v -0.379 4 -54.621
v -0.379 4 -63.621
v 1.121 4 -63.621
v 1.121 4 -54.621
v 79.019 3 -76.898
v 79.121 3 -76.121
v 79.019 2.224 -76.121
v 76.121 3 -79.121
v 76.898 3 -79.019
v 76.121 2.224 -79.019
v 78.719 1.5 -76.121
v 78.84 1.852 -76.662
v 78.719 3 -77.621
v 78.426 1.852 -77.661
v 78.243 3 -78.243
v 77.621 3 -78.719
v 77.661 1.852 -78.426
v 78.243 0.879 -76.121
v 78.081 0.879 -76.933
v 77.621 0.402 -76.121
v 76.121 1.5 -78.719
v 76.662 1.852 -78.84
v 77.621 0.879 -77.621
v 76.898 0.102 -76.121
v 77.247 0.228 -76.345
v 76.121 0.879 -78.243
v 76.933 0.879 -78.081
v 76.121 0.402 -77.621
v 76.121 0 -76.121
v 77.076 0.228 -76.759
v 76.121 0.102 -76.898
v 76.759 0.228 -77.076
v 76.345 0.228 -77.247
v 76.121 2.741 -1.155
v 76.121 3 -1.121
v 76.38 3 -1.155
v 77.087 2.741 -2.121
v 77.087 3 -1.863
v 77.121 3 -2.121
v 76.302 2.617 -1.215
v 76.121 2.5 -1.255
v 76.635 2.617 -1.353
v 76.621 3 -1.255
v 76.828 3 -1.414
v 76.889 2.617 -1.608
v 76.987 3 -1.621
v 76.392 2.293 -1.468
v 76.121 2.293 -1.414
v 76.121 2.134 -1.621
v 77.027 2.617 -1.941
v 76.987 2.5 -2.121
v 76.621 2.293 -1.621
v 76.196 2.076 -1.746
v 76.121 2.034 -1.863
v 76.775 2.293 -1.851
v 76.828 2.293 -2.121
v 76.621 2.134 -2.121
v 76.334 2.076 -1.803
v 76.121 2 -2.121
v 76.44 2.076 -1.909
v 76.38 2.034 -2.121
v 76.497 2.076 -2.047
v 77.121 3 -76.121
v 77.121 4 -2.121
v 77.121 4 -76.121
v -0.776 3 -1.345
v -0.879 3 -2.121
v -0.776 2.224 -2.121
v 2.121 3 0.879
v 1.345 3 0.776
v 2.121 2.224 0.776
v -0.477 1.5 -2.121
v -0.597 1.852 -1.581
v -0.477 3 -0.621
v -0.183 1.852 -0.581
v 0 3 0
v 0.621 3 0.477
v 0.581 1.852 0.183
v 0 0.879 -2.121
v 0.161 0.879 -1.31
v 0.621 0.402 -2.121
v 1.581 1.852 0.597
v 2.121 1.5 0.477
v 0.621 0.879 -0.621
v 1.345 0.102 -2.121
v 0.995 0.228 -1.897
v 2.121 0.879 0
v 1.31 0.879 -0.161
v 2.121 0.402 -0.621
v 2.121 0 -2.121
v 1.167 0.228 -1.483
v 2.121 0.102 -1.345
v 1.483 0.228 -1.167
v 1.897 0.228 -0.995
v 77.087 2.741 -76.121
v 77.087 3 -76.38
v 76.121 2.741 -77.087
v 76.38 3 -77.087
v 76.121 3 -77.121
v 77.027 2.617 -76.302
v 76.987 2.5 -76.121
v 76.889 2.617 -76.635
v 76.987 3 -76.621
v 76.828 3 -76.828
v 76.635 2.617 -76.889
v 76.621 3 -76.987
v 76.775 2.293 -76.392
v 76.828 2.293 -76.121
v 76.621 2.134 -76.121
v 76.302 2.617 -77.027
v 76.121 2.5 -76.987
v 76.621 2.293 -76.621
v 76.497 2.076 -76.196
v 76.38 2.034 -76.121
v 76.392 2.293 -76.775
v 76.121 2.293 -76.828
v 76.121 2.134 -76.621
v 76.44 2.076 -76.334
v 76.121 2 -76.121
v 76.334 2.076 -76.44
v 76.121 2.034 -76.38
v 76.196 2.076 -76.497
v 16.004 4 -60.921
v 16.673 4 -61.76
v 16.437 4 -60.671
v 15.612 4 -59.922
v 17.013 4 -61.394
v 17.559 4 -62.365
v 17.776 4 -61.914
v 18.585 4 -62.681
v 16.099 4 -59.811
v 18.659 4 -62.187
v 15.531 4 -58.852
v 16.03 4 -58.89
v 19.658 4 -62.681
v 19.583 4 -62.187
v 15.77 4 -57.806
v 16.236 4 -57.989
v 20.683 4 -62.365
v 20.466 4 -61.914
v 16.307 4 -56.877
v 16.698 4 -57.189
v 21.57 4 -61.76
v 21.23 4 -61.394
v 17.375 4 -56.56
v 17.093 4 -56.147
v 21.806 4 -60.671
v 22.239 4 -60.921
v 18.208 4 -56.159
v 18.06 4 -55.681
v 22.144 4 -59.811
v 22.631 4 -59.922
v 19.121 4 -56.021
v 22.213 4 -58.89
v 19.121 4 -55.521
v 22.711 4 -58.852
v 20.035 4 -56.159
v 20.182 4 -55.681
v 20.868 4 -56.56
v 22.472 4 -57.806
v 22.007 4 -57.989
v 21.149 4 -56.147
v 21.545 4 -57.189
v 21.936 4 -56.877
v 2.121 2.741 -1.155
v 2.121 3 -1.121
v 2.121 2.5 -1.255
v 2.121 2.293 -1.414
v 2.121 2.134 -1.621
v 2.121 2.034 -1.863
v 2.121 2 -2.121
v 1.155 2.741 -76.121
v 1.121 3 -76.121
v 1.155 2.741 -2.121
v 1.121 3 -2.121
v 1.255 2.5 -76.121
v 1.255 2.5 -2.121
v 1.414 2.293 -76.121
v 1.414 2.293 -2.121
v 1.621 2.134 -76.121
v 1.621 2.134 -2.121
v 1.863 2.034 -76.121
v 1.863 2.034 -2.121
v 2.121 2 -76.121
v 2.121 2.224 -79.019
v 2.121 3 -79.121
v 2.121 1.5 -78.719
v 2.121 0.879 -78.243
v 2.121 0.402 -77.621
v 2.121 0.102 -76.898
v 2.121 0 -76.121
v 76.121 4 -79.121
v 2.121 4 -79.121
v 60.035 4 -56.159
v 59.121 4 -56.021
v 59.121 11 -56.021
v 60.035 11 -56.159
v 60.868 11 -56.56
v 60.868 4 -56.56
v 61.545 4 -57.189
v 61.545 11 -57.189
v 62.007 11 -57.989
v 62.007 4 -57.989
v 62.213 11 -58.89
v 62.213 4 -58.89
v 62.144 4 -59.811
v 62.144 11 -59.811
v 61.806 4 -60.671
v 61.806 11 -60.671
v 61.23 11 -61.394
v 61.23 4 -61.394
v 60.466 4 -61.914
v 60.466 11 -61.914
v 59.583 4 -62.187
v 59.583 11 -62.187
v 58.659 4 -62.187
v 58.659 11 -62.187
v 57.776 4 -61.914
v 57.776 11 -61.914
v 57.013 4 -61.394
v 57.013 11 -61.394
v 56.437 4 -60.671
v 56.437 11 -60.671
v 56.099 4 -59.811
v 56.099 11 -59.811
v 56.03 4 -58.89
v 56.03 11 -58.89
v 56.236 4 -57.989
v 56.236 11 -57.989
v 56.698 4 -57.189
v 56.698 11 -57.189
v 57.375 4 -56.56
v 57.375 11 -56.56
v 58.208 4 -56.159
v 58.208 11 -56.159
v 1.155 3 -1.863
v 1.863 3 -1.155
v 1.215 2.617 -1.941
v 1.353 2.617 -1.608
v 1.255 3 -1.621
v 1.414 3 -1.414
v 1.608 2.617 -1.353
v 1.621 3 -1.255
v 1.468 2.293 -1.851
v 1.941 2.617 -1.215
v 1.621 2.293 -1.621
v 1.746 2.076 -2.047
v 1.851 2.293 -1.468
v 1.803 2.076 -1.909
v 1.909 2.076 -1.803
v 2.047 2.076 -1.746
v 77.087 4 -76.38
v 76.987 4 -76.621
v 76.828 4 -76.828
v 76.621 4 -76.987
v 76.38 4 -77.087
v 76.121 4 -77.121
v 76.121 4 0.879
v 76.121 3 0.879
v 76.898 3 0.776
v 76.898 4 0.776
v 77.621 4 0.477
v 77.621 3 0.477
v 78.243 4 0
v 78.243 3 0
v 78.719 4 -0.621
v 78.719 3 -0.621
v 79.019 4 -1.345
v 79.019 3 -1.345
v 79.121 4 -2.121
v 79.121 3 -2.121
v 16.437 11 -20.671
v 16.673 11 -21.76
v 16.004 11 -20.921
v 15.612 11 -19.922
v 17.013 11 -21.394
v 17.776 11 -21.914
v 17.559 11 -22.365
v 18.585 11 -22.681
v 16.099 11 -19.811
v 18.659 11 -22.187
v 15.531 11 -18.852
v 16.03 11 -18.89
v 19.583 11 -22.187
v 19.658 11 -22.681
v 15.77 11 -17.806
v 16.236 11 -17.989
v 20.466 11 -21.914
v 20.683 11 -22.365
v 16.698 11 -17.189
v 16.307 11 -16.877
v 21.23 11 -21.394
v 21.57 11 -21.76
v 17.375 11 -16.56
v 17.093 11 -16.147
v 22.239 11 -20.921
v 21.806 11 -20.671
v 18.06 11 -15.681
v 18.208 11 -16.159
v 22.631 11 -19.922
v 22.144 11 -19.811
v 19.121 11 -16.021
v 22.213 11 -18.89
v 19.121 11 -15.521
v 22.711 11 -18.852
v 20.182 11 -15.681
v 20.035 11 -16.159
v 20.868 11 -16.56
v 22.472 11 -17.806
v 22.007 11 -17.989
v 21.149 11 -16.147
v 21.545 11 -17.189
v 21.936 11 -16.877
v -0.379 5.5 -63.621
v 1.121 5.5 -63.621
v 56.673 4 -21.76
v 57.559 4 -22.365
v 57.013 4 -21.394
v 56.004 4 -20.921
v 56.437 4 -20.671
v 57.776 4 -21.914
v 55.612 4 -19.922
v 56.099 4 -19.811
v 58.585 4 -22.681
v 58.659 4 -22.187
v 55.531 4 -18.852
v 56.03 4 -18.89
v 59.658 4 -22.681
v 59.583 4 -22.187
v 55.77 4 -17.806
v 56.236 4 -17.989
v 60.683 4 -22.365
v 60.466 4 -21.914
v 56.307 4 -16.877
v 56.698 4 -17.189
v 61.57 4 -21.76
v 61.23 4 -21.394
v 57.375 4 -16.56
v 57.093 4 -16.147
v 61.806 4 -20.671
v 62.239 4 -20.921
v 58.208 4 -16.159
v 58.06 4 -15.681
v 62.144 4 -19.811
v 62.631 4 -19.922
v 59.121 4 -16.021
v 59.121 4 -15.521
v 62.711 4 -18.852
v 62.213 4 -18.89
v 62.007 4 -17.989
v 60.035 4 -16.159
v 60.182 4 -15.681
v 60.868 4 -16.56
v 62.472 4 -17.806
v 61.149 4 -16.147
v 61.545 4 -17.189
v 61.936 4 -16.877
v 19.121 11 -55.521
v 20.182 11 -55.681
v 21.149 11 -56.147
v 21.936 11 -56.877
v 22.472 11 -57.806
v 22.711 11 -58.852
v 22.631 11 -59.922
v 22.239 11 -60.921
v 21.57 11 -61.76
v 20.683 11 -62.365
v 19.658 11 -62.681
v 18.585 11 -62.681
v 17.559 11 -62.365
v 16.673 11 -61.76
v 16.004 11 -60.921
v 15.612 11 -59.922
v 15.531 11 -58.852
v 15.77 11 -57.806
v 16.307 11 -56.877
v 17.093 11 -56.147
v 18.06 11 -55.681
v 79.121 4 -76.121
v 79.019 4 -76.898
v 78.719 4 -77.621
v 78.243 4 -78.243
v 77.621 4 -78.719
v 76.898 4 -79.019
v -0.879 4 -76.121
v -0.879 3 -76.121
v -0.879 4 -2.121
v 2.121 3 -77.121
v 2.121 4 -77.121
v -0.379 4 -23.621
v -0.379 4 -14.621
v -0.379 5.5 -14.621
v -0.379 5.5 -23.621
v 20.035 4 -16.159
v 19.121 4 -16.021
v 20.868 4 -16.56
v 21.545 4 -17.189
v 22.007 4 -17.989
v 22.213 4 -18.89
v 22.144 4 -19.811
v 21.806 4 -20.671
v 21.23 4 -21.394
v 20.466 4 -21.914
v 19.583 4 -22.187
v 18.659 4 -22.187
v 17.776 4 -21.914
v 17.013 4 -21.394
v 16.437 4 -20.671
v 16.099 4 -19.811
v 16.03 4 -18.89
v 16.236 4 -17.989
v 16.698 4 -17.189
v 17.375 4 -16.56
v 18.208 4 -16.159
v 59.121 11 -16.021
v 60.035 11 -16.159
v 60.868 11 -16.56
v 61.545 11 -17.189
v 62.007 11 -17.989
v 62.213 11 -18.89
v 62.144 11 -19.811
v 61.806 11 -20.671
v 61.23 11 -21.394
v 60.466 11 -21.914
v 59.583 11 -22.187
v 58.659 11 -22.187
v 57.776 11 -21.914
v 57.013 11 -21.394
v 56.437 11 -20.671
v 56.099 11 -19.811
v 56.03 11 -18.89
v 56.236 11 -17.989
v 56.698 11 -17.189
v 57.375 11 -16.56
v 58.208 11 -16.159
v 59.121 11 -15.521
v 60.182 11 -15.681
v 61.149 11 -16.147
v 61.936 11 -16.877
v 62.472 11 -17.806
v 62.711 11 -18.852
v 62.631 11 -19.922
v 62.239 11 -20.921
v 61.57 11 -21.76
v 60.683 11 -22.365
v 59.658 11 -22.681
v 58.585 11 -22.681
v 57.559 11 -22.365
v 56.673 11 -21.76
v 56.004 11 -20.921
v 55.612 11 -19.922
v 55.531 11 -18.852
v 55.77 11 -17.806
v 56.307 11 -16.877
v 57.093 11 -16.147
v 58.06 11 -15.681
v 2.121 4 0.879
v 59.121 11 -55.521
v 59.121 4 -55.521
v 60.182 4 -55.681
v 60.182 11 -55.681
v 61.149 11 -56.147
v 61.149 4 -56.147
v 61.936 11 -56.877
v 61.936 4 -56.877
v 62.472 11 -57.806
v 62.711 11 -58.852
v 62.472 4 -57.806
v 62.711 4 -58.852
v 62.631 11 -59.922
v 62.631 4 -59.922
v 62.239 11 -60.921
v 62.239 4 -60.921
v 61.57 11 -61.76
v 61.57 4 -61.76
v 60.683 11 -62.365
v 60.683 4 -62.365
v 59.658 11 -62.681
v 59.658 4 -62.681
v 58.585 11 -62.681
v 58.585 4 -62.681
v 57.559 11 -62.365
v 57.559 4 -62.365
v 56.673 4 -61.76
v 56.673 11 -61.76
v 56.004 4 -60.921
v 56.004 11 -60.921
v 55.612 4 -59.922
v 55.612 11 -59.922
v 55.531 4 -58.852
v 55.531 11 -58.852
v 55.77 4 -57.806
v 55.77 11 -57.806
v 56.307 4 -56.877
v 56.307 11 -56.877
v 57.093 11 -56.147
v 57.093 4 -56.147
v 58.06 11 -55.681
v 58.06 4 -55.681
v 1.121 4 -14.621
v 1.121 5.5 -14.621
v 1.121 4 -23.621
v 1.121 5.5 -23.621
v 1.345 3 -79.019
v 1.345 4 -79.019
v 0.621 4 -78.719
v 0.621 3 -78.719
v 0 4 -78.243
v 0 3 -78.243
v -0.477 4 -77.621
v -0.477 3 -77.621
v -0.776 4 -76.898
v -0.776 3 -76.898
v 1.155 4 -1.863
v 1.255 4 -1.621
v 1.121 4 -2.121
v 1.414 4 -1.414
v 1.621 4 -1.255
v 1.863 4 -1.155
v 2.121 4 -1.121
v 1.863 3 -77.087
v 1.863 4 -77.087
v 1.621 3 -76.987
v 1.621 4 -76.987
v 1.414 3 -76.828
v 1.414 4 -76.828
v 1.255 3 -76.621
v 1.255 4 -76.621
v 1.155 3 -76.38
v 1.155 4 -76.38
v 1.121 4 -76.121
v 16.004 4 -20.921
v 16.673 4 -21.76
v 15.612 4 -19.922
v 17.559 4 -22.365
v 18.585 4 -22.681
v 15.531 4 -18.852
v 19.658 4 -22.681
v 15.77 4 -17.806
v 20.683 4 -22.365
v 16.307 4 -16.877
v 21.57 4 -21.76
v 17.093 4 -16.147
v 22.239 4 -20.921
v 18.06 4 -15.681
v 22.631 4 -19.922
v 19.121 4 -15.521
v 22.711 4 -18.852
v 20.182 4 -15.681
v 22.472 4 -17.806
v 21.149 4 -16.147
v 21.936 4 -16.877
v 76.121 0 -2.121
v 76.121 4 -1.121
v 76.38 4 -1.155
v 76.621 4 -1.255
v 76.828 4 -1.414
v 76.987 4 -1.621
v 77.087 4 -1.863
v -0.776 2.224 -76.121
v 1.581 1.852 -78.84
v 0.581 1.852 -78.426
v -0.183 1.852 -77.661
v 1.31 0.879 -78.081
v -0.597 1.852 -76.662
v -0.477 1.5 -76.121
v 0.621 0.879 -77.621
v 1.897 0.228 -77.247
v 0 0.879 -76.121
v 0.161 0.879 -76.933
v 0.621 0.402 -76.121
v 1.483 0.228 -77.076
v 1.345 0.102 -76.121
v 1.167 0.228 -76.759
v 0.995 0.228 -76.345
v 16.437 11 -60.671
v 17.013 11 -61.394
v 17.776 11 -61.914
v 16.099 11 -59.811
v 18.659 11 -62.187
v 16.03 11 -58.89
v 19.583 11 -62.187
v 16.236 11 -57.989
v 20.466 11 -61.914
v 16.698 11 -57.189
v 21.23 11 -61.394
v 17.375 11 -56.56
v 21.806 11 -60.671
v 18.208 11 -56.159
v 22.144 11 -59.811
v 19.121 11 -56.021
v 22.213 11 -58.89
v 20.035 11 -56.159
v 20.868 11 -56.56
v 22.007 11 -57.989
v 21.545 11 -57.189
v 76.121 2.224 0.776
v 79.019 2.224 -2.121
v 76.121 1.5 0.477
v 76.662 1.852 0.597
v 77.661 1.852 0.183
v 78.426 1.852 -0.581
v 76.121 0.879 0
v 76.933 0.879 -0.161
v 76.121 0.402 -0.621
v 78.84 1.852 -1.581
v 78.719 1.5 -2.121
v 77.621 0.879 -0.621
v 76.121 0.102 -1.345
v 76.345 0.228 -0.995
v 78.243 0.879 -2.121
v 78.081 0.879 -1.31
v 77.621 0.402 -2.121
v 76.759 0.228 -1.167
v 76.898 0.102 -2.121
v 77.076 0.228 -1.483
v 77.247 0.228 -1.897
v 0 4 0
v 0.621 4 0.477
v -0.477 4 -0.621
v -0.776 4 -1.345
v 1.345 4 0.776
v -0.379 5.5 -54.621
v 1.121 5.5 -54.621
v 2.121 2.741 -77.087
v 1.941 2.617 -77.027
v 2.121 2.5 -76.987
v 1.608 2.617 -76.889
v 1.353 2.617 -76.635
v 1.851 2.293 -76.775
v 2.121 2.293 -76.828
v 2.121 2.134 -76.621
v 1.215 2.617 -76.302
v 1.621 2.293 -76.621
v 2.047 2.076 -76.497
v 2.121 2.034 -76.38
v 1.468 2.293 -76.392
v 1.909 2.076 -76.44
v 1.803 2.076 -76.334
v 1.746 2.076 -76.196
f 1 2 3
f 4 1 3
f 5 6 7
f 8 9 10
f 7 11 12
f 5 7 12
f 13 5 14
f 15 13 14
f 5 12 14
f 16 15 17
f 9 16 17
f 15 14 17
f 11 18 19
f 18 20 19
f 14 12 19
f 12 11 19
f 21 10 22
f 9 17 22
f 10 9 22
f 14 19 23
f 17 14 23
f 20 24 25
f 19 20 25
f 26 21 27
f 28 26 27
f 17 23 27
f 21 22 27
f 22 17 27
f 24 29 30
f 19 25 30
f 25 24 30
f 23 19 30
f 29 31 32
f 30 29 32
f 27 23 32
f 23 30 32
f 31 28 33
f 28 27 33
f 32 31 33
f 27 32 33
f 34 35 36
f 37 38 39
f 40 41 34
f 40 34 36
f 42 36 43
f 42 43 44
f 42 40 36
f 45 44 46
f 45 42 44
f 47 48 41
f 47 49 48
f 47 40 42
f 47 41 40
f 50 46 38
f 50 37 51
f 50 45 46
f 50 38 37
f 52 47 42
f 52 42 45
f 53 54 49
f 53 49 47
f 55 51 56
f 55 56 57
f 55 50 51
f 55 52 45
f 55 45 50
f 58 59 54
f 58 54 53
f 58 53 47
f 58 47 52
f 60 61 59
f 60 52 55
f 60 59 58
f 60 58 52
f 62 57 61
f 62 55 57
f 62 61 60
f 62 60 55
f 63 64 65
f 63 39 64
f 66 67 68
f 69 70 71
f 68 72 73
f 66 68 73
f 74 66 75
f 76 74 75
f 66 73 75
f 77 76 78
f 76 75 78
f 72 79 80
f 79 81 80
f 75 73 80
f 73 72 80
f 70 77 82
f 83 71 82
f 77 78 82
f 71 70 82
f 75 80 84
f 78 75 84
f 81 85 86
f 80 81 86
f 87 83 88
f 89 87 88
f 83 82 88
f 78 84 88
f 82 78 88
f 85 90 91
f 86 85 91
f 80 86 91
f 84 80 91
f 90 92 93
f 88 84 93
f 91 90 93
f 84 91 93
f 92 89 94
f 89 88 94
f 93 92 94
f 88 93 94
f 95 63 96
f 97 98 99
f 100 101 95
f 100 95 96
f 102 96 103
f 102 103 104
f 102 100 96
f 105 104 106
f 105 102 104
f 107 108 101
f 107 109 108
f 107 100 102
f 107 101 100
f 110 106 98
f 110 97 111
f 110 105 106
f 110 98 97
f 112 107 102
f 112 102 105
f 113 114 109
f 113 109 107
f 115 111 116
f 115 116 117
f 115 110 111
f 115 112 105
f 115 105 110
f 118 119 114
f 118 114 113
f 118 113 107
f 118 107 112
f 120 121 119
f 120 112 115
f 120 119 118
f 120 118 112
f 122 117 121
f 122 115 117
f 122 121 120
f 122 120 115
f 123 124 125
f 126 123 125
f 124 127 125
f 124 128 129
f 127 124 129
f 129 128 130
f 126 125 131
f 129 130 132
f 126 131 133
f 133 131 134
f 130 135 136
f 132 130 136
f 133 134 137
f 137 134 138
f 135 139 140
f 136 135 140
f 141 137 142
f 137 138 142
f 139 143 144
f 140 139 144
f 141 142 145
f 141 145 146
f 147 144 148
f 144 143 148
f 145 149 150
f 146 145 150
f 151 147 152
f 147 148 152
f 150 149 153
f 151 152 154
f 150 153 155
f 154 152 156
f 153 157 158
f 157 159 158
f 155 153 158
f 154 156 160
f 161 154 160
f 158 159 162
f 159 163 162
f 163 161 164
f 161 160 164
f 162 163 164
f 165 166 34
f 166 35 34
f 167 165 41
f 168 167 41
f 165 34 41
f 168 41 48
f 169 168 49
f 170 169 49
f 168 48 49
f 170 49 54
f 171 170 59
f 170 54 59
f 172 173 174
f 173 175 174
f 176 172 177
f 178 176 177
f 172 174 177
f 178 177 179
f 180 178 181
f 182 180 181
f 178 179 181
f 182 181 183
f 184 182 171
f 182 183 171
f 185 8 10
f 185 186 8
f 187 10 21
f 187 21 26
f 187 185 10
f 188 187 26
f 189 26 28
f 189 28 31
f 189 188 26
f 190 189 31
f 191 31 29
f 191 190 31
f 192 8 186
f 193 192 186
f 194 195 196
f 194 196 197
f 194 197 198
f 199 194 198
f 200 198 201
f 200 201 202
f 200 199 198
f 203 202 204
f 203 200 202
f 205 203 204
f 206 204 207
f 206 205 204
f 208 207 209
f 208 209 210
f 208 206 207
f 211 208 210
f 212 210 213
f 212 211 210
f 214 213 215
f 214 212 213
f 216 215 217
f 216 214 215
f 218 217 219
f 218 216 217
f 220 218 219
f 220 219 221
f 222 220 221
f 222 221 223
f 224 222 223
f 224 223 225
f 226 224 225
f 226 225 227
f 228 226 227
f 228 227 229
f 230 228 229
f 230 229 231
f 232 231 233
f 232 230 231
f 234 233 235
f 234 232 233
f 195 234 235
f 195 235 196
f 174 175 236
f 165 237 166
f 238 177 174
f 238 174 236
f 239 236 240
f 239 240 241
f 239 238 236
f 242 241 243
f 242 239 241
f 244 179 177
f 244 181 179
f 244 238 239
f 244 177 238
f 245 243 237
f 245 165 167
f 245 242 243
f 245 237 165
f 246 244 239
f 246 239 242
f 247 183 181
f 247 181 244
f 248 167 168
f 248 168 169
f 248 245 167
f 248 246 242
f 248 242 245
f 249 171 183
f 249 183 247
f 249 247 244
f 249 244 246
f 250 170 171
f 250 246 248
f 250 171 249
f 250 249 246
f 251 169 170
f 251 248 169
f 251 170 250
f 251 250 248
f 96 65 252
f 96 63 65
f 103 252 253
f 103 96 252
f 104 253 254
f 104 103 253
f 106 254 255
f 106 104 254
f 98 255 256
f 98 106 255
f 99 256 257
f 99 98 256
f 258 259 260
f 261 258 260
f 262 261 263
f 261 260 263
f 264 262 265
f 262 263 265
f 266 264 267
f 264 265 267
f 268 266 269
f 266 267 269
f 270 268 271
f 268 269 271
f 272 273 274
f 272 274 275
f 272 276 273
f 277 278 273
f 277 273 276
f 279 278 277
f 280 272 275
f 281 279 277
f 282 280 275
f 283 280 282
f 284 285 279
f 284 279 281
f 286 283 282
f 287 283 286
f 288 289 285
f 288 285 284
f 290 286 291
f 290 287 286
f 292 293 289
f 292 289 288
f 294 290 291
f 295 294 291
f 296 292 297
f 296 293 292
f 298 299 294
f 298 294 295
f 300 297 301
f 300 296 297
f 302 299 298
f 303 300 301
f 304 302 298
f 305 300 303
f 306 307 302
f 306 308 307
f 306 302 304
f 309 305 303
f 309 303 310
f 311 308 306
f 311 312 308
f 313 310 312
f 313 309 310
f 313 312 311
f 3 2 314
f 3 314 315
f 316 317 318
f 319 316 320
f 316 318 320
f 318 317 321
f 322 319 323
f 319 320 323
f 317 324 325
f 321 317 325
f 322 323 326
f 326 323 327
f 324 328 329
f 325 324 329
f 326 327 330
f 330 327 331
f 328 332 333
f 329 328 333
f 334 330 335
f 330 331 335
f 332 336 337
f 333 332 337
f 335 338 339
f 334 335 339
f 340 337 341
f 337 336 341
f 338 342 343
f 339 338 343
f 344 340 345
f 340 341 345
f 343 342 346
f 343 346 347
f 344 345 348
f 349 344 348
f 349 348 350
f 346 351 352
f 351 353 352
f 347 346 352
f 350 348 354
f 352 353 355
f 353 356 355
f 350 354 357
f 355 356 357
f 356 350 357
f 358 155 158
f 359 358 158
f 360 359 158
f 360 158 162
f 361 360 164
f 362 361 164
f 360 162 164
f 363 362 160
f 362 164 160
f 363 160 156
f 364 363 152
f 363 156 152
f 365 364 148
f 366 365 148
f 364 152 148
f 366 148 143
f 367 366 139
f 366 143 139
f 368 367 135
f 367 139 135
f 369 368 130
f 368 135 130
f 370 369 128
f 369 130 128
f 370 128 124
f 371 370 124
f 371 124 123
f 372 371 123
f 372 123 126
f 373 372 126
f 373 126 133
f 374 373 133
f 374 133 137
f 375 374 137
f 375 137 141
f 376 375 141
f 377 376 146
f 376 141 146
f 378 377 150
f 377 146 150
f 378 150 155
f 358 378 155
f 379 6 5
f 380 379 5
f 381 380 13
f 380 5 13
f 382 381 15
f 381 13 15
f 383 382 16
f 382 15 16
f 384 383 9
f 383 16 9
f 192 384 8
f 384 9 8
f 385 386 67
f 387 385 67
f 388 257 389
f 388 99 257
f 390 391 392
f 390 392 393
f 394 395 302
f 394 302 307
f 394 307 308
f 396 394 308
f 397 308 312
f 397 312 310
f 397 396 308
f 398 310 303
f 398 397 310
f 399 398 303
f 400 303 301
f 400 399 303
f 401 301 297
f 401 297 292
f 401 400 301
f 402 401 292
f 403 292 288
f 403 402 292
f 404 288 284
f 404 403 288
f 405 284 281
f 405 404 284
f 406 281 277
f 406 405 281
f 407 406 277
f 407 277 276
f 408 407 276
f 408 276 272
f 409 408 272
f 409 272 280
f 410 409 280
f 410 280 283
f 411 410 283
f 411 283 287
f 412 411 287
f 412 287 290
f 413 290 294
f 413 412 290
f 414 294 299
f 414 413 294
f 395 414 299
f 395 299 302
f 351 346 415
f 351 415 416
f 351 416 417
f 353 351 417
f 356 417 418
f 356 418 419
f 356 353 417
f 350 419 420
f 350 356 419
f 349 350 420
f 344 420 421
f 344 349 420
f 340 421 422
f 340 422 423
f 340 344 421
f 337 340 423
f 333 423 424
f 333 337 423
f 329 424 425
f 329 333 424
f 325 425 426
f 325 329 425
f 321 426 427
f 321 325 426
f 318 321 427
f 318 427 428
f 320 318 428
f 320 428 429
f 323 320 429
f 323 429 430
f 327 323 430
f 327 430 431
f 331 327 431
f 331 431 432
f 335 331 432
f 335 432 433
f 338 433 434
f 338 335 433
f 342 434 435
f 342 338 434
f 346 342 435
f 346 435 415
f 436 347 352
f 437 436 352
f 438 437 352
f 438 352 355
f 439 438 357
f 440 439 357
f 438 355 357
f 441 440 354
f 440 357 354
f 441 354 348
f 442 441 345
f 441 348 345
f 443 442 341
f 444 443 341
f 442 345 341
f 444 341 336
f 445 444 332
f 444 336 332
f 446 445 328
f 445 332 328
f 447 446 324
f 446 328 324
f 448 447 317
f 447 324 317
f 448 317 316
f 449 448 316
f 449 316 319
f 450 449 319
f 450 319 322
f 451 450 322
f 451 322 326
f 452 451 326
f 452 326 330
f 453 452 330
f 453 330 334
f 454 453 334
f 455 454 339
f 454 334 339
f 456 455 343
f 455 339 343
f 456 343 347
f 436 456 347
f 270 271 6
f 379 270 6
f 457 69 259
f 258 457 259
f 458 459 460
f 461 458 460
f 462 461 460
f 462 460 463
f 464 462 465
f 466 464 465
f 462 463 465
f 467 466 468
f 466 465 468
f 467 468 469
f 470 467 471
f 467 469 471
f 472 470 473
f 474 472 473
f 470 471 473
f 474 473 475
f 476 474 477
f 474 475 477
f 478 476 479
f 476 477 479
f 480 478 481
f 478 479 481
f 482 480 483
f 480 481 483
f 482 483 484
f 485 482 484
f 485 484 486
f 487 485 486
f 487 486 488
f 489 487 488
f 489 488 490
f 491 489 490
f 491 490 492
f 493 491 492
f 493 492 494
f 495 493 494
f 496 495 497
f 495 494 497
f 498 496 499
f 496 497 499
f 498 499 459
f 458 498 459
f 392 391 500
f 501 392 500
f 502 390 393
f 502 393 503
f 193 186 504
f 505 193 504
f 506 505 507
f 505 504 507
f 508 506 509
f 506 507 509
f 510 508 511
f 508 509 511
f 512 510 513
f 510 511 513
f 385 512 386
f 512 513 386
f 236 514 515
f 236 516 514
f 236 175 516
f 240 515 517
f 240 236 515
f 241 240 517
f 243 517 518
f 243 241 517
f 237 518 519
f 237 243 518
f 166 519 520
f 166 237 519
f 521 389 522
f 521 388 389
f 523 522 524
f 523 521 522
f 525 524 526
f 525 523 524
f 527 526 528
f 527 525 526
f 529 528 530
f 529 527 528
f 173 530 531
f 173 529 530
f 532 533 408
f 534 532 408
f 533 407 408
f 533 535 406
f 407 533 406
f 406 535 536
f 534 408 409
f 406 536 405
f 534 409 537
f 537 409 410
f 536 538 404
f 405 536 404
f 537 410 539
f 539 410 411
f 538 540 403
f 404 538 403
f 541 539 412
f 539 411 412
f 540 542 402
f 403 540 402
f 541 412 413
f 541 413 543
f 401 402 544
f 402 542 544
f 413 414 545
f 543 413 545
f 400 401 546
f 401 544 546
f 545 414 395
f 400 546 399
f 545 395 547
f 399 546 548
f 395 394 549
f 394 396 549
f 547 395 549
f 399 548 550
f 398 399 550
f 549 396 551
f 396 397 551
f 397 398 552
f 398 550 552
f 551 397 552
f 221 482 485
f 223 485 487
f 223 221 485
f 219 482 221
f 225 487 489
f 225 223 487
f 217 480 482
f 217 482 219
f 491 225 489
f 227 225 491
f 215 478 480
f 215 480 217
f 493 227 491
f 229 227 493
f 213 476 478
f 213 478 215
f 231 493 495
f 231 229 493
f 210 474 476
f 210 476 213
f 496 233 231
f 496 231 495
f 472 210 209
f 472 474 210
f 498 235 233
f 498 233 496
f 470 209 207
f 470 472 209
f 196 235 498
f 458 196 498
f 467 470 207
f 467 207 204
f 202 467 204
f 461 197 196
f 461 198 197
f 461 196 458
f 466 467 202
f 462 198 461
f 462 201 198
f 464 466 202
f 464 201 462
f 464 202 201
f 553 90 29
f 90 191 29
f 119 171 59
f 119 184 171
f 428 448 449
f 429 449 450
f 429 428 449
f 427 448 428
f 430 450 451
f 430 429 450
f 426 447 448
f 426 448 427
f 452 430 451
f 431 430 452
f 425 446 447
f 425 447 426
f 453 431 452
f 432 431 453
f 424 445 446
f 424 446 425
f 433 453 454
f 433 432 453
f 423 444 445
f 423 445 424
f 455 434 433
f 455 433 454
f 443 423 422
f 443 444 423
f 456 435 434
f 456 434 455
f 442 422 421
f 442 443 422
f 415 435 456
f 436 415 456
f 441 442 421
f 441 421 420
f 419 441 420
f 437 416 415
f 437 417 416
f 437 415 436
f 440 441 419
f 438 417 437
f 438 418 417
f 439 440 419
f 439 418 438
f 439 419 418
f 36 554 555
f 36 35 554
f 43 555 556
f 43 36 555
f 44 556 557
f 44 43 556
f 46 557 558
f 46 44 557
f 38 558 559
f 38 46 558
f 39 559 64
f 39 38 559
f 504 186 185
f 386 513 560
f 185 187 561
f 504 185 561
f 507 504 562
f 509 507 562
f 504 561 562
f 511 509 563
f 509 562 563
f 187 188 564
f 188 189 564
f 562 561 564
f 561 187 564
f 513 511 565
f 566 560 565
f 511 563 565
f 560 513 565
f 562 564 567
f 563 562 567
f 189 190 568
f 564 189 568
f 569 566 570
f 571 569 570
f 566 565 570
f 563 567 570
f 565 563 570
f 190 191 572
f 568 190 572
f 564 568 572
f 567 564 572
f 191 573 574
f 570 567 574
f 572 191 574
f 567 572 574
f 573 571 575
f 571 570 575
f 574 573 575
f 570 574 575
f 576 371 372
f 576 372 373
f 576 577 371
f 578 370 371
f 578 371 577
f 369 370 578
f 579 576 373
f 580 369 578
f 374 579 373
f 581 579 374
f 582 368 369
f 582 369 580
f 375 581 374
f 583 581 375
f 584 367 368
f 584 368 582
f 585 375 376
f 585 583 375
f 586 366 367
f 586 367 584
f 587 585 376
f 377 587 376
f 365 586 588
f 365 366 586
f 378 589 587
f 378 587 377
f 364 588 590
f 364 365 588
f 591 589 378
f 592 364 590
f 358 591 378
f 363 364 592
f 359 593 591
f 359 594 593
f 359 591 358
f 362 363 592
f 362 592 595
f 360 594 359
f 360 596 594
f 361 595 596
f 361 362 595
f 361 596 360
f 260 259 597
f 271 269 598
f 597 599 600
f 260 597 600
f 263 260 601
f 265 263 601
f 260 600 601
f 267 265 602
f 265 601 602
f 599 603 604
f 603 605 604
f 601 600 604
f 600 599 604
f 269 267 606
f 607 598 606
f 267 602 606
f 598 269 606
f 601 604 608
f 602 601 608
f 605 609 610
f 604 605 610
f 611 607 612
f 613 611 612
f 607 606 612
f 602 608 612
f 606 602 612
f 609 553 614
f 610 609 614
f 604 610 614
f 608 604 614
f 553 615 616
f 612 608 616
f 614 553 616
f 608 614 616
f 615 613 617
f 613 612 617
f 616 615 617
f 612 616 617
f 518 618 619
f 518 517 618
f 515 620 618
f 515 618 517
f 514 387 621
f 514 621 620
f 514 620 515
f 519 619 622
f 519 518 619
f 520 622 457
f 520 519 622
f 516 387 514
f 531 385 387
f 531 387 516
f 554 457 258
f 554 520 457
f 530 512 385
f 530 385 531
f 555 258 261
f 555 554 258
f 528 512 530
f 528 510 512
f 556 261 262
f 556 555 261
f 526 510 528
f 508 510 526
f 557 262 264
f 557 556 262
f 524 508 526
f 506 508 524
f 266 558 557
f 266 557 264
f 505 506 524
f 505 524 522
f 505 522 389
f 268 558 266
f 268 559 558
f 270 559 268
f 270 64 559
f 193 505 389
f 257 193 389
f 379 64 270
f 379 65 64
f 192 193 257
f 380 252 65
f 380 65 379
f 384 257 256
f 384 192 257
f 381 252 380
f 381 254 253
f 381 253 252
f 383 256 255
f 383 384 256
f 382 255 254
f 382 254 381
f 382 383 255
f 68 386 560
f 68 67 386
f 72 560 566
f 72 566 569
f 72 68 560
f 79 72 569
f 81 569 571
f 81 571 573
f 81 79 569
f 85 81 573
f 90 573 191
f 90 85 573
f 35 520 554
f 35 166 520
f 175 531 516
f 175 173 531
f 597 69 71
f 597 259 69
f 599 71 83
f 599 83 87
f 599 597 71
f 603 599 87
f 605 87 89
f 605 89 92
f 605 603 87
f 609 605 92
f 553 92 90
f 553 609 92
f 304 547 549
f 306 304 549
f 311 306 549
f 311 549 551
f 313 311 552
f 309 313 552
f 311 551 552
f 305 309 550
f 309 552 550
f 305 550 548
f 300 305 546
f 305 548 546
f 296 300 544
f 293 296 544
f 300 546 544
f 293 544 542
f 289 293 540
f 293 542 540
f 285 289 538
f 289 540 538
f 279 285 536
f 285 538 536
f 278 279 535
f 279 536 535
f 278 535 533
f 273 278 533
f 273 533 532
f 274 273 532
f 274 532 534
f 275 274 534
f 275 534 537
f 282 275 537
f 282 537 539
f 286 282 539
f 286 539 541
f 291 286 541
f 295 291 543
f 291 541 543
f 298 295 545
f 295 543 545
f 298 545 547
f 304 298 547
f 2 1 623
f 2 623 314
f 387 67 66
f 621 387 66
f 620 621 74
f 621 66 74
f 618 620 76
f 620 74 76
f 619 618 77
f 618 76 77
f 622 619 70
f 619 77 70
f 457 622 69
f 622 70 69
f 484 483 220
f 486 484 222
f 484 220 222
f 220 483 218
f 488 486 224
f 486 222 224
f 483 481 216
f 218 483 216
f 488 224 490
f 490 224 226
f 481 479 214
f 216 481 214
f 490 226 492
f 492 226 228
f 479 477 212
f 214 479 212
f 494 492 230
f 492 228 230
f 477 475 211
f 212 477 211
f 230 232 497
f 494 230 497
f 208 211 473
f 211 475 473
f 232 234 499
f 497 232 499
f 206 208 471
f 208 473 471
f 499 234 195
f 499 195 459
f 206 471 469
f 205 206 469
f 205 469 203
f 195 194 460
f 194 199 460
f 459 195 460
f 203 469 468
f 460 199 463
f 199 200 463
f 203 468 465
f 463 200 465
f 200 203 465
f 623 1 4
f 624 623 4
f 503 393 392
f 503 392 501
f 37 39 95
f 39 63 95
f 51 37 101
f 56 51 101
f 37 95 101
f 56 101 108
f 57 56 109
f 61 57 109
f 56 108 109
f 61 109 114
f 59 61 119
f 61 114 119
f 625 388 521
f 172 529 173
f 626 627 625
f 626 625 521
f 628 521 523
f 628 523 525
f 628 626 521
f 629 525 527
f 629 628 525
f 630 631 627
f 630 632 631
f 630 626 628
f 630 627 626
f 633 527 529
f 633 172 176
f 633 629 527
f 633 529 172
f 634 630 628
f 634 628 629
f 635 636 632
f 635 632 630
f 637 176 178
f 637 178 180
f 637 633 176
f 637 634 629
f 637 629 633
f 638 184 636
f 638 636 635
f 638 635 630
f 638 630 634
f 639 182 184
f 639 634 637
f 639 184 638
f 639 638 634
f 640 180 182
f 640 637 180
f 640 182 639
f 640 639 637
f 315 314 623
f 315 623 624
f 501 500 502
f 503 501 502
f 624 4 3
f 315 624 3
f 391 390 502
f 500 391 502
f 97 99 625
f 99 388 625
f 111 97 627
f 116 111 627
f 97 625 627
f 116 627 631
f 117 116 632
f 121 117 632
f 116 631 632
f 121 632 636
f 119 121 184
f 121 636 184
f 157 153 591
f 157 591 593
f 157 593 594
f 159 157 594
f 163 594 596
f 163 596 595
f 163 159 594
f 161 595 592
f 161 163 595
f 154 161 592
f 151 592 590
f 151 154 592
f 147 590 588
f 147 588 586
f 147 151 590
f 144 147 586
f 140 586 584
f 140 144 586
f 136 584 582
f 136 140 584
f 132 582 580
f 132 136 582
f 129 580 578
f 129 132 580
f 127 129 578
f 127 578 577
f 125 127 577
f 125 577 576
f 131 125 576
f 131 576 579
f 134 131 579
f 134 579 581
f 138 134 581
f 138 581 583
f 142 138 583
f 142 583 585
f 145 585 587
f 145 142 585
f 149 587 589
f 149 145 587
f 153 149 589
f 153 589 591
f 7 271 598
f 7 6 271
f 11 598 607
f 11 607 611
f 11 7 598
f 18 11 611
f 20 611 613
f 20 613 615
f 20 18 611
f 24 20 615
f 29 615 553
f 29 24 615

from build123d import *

# Parameters (mm, degrees)
EXTRUDE_1_DEPTH   = 4
FILLET_1_R        = 3
SHELL_1_T         = -2
SKETCH_3_R        = 3.6
SKETCH_3_R_2      = 3.1
EXTRUDE_2_DEPTH   = 7
EXTRUDE_2_2_DEPTH = 7
EXTRUDE_2_3_DEPTH = 7
EXTRUDE_2_4_DEPTH = 7
SKETCH_4_W        = 1.5
SKETCH_4_H        = 9
EXTRUDE_3_DEPTH   = 1.5
EXTRUDE_3_2_DEPTH = 1.5


with BuildPart() as part:
    # 草图1 → 凸台-拉伸1 (new body)
    with BuildSketch(Plane(origin=(0, 0, 0), x_dir=(1, 0, 0), z_dir=(0, 1, 0))):
        with BuildLine():
            Line((2.121320344, -0.878679656), (76.121320344, -0.878679656))
            ThreePointArc((76.121320344, -0.878679656), (78.242640687, 0), (79.121320344, 2.121320344))
            Line((79.121320344, 2.121320344), (79.121320344, 76.121320344))
            ThreePointArc((79.121320344, 76.121320344), (78.242640687, 78.242640687), (76.121320344, 79.121320344))
            Line((76.121320344, 79.121320344), (2.121320344, 79.121320344))
            ThreePointArc((2.121320344, 79.121320344), (0, 78.242640687), (-0.878679656, 76.121320344))
            Line((-0.878679656, 76.121320344), (-0.878679656, 2.121320344))
            ThreePointArc((-0.878679656, 2.121320344), (0, 0), (2.121320344, -0.878679656))
        make_face()
    extrude(amount=EXTRUDE_1_DEPTH)

    # 圆角1
    fillet_1_edges = [part.edges().sort_by_distance(p)[0] for p in [
        (39.121320344, 0, 0.878679656),
        (0, 0, 0),
        (-0.878679656, 0, -39.121320344),
        (0, 0, -78.242640687),
        (39.121320344, 0, -79.121320344),
        (78.242640687, 0, -78.242640687),
        (79.121320344, 0, -39.121320344),
        (78.242640687, 0, 0),
    ]]
    fillet(fillet_1_edges, radius=FILLET_1_R)

    # 抽壳1
    shell_1_openings = [part.faces().sort_by_distance(p)[0] for p in [
        (39.121320344, 4, -39.121320344),
    ]]
    offset(amount=SHELL_1_T, openings=shell_1_openings, kind=Kind.INTERSECTION)


with BuildPart() as body_2:
    # 草图3 → 凸台-拉伸2 (new body)
    with BuildSketch(Plane(origin=(0, 4, 0), x_dir=(1, 0, 0), z_dir=(0, 1, 0))):
        with Locations(Location((19.121320344, 59.121320344, 0), (0, 0, 270))):
            Circle(SKETCH_3_R)
        with Locations(Location((19.121320344, 59.121320344, 0), (0, 0, 270))):
            Circle(SKETCH_3_R_2, mode=Mode.SUBTRACT)
    extrude(amount=EXTRUDE_2_DEPTH)


with BuildPart() as body_3:
    # 草图3 → Extrude 2 2 (new body)
    with BuildSketch(Plane(origin=(0, 4, 0), x_dir=(1, 0, 0), z_dir=(0, 1, 0))):
        with Locations(Location((59.121320344, 59.121320344, 0), (0, 0, 270))):
            Circle(SKETCH_3_R)
        with Locations(Location((59.121320344, 59.121320344, 0), (0, 0, 270))):
            Circle(SKETCH_3_R_2, mode=Mode.SUBTRACT)
    extrude(amount=EXTRUDE_2_2_DEPTH)


with BuildPart() as body_4:
    # 草图3 → Extrude 2 3 (new body)
    with BuildSketch(Plane(origin=(0, 4, 0), x_dir=(1, 0, 0), z_dir=(0, 1, 0))):
        with Locations(Location((59.121320344, 19.121320344, 0), (0, 0, 270))):
            Circle(SKETCH_3_R)
        with Locations(Location((59.121320344, 19.121320344, 0), (0, 0, 270))):
            Circle(SKETCH_3_R_2, mode=Mode.SUBTRACT)
    extrude(amount=EXTRUDE_2_3_DEPTH)


with BuildPart() as body_5:
    # 草图3 → Extrude 2 4 (new body)
    with BuildSketch(Plane(origin=(0, 4, 0), x_dir=(1, 0, 0), z_dir=(0, 1, 0))):
        with Locations(Location((19.121320344, 19.121320344, 0), (0, 0, 270))):
            Circle(SKETCH_3_R)
        with Locations(Location((19.121320344, 19.121320344, 0), (0, 0, 270))):
            Circle(SKETCH_3_R_2, mode=Mode.SUBTRACT)
    extrude(amount=EXTRUDE_2_4_DEPTH)


with BuildPart() as body_6:
    # 草图4 → 凸台-拉伸3 (new body)
    with BuildSketch(Plane(origin=(0, 4, 0), x_dir=(1, 0, 0), z_dir=(0, 1, 0))):
        with Locations((0.371320344, 59.121320344)):
            Rectangle(SKETCH_4_W, SKETCH_4_H)
    extrude(amount=EXTRUDE_3_DEPTH)


with BuildPart() as body_7:
    # 草图4 → Extrude 3 2 (new body)
    with BuildSketch(Plane(origin=(0, 4, 0), x_dir=(1, 0, 0), z_dir=(0, 1, 0))):
        with Locations((0.371320344, 19.121320344)):
            Rectangle(SKETCH_4_W, SKETCH_4_H)
    extrude(amount=EXTRUDE_3_2_DEPTH)


solid = Compound([part.part, body_2.part, body_3.part, body_4.part, body_5.part, body_6.part, body_7.part])
